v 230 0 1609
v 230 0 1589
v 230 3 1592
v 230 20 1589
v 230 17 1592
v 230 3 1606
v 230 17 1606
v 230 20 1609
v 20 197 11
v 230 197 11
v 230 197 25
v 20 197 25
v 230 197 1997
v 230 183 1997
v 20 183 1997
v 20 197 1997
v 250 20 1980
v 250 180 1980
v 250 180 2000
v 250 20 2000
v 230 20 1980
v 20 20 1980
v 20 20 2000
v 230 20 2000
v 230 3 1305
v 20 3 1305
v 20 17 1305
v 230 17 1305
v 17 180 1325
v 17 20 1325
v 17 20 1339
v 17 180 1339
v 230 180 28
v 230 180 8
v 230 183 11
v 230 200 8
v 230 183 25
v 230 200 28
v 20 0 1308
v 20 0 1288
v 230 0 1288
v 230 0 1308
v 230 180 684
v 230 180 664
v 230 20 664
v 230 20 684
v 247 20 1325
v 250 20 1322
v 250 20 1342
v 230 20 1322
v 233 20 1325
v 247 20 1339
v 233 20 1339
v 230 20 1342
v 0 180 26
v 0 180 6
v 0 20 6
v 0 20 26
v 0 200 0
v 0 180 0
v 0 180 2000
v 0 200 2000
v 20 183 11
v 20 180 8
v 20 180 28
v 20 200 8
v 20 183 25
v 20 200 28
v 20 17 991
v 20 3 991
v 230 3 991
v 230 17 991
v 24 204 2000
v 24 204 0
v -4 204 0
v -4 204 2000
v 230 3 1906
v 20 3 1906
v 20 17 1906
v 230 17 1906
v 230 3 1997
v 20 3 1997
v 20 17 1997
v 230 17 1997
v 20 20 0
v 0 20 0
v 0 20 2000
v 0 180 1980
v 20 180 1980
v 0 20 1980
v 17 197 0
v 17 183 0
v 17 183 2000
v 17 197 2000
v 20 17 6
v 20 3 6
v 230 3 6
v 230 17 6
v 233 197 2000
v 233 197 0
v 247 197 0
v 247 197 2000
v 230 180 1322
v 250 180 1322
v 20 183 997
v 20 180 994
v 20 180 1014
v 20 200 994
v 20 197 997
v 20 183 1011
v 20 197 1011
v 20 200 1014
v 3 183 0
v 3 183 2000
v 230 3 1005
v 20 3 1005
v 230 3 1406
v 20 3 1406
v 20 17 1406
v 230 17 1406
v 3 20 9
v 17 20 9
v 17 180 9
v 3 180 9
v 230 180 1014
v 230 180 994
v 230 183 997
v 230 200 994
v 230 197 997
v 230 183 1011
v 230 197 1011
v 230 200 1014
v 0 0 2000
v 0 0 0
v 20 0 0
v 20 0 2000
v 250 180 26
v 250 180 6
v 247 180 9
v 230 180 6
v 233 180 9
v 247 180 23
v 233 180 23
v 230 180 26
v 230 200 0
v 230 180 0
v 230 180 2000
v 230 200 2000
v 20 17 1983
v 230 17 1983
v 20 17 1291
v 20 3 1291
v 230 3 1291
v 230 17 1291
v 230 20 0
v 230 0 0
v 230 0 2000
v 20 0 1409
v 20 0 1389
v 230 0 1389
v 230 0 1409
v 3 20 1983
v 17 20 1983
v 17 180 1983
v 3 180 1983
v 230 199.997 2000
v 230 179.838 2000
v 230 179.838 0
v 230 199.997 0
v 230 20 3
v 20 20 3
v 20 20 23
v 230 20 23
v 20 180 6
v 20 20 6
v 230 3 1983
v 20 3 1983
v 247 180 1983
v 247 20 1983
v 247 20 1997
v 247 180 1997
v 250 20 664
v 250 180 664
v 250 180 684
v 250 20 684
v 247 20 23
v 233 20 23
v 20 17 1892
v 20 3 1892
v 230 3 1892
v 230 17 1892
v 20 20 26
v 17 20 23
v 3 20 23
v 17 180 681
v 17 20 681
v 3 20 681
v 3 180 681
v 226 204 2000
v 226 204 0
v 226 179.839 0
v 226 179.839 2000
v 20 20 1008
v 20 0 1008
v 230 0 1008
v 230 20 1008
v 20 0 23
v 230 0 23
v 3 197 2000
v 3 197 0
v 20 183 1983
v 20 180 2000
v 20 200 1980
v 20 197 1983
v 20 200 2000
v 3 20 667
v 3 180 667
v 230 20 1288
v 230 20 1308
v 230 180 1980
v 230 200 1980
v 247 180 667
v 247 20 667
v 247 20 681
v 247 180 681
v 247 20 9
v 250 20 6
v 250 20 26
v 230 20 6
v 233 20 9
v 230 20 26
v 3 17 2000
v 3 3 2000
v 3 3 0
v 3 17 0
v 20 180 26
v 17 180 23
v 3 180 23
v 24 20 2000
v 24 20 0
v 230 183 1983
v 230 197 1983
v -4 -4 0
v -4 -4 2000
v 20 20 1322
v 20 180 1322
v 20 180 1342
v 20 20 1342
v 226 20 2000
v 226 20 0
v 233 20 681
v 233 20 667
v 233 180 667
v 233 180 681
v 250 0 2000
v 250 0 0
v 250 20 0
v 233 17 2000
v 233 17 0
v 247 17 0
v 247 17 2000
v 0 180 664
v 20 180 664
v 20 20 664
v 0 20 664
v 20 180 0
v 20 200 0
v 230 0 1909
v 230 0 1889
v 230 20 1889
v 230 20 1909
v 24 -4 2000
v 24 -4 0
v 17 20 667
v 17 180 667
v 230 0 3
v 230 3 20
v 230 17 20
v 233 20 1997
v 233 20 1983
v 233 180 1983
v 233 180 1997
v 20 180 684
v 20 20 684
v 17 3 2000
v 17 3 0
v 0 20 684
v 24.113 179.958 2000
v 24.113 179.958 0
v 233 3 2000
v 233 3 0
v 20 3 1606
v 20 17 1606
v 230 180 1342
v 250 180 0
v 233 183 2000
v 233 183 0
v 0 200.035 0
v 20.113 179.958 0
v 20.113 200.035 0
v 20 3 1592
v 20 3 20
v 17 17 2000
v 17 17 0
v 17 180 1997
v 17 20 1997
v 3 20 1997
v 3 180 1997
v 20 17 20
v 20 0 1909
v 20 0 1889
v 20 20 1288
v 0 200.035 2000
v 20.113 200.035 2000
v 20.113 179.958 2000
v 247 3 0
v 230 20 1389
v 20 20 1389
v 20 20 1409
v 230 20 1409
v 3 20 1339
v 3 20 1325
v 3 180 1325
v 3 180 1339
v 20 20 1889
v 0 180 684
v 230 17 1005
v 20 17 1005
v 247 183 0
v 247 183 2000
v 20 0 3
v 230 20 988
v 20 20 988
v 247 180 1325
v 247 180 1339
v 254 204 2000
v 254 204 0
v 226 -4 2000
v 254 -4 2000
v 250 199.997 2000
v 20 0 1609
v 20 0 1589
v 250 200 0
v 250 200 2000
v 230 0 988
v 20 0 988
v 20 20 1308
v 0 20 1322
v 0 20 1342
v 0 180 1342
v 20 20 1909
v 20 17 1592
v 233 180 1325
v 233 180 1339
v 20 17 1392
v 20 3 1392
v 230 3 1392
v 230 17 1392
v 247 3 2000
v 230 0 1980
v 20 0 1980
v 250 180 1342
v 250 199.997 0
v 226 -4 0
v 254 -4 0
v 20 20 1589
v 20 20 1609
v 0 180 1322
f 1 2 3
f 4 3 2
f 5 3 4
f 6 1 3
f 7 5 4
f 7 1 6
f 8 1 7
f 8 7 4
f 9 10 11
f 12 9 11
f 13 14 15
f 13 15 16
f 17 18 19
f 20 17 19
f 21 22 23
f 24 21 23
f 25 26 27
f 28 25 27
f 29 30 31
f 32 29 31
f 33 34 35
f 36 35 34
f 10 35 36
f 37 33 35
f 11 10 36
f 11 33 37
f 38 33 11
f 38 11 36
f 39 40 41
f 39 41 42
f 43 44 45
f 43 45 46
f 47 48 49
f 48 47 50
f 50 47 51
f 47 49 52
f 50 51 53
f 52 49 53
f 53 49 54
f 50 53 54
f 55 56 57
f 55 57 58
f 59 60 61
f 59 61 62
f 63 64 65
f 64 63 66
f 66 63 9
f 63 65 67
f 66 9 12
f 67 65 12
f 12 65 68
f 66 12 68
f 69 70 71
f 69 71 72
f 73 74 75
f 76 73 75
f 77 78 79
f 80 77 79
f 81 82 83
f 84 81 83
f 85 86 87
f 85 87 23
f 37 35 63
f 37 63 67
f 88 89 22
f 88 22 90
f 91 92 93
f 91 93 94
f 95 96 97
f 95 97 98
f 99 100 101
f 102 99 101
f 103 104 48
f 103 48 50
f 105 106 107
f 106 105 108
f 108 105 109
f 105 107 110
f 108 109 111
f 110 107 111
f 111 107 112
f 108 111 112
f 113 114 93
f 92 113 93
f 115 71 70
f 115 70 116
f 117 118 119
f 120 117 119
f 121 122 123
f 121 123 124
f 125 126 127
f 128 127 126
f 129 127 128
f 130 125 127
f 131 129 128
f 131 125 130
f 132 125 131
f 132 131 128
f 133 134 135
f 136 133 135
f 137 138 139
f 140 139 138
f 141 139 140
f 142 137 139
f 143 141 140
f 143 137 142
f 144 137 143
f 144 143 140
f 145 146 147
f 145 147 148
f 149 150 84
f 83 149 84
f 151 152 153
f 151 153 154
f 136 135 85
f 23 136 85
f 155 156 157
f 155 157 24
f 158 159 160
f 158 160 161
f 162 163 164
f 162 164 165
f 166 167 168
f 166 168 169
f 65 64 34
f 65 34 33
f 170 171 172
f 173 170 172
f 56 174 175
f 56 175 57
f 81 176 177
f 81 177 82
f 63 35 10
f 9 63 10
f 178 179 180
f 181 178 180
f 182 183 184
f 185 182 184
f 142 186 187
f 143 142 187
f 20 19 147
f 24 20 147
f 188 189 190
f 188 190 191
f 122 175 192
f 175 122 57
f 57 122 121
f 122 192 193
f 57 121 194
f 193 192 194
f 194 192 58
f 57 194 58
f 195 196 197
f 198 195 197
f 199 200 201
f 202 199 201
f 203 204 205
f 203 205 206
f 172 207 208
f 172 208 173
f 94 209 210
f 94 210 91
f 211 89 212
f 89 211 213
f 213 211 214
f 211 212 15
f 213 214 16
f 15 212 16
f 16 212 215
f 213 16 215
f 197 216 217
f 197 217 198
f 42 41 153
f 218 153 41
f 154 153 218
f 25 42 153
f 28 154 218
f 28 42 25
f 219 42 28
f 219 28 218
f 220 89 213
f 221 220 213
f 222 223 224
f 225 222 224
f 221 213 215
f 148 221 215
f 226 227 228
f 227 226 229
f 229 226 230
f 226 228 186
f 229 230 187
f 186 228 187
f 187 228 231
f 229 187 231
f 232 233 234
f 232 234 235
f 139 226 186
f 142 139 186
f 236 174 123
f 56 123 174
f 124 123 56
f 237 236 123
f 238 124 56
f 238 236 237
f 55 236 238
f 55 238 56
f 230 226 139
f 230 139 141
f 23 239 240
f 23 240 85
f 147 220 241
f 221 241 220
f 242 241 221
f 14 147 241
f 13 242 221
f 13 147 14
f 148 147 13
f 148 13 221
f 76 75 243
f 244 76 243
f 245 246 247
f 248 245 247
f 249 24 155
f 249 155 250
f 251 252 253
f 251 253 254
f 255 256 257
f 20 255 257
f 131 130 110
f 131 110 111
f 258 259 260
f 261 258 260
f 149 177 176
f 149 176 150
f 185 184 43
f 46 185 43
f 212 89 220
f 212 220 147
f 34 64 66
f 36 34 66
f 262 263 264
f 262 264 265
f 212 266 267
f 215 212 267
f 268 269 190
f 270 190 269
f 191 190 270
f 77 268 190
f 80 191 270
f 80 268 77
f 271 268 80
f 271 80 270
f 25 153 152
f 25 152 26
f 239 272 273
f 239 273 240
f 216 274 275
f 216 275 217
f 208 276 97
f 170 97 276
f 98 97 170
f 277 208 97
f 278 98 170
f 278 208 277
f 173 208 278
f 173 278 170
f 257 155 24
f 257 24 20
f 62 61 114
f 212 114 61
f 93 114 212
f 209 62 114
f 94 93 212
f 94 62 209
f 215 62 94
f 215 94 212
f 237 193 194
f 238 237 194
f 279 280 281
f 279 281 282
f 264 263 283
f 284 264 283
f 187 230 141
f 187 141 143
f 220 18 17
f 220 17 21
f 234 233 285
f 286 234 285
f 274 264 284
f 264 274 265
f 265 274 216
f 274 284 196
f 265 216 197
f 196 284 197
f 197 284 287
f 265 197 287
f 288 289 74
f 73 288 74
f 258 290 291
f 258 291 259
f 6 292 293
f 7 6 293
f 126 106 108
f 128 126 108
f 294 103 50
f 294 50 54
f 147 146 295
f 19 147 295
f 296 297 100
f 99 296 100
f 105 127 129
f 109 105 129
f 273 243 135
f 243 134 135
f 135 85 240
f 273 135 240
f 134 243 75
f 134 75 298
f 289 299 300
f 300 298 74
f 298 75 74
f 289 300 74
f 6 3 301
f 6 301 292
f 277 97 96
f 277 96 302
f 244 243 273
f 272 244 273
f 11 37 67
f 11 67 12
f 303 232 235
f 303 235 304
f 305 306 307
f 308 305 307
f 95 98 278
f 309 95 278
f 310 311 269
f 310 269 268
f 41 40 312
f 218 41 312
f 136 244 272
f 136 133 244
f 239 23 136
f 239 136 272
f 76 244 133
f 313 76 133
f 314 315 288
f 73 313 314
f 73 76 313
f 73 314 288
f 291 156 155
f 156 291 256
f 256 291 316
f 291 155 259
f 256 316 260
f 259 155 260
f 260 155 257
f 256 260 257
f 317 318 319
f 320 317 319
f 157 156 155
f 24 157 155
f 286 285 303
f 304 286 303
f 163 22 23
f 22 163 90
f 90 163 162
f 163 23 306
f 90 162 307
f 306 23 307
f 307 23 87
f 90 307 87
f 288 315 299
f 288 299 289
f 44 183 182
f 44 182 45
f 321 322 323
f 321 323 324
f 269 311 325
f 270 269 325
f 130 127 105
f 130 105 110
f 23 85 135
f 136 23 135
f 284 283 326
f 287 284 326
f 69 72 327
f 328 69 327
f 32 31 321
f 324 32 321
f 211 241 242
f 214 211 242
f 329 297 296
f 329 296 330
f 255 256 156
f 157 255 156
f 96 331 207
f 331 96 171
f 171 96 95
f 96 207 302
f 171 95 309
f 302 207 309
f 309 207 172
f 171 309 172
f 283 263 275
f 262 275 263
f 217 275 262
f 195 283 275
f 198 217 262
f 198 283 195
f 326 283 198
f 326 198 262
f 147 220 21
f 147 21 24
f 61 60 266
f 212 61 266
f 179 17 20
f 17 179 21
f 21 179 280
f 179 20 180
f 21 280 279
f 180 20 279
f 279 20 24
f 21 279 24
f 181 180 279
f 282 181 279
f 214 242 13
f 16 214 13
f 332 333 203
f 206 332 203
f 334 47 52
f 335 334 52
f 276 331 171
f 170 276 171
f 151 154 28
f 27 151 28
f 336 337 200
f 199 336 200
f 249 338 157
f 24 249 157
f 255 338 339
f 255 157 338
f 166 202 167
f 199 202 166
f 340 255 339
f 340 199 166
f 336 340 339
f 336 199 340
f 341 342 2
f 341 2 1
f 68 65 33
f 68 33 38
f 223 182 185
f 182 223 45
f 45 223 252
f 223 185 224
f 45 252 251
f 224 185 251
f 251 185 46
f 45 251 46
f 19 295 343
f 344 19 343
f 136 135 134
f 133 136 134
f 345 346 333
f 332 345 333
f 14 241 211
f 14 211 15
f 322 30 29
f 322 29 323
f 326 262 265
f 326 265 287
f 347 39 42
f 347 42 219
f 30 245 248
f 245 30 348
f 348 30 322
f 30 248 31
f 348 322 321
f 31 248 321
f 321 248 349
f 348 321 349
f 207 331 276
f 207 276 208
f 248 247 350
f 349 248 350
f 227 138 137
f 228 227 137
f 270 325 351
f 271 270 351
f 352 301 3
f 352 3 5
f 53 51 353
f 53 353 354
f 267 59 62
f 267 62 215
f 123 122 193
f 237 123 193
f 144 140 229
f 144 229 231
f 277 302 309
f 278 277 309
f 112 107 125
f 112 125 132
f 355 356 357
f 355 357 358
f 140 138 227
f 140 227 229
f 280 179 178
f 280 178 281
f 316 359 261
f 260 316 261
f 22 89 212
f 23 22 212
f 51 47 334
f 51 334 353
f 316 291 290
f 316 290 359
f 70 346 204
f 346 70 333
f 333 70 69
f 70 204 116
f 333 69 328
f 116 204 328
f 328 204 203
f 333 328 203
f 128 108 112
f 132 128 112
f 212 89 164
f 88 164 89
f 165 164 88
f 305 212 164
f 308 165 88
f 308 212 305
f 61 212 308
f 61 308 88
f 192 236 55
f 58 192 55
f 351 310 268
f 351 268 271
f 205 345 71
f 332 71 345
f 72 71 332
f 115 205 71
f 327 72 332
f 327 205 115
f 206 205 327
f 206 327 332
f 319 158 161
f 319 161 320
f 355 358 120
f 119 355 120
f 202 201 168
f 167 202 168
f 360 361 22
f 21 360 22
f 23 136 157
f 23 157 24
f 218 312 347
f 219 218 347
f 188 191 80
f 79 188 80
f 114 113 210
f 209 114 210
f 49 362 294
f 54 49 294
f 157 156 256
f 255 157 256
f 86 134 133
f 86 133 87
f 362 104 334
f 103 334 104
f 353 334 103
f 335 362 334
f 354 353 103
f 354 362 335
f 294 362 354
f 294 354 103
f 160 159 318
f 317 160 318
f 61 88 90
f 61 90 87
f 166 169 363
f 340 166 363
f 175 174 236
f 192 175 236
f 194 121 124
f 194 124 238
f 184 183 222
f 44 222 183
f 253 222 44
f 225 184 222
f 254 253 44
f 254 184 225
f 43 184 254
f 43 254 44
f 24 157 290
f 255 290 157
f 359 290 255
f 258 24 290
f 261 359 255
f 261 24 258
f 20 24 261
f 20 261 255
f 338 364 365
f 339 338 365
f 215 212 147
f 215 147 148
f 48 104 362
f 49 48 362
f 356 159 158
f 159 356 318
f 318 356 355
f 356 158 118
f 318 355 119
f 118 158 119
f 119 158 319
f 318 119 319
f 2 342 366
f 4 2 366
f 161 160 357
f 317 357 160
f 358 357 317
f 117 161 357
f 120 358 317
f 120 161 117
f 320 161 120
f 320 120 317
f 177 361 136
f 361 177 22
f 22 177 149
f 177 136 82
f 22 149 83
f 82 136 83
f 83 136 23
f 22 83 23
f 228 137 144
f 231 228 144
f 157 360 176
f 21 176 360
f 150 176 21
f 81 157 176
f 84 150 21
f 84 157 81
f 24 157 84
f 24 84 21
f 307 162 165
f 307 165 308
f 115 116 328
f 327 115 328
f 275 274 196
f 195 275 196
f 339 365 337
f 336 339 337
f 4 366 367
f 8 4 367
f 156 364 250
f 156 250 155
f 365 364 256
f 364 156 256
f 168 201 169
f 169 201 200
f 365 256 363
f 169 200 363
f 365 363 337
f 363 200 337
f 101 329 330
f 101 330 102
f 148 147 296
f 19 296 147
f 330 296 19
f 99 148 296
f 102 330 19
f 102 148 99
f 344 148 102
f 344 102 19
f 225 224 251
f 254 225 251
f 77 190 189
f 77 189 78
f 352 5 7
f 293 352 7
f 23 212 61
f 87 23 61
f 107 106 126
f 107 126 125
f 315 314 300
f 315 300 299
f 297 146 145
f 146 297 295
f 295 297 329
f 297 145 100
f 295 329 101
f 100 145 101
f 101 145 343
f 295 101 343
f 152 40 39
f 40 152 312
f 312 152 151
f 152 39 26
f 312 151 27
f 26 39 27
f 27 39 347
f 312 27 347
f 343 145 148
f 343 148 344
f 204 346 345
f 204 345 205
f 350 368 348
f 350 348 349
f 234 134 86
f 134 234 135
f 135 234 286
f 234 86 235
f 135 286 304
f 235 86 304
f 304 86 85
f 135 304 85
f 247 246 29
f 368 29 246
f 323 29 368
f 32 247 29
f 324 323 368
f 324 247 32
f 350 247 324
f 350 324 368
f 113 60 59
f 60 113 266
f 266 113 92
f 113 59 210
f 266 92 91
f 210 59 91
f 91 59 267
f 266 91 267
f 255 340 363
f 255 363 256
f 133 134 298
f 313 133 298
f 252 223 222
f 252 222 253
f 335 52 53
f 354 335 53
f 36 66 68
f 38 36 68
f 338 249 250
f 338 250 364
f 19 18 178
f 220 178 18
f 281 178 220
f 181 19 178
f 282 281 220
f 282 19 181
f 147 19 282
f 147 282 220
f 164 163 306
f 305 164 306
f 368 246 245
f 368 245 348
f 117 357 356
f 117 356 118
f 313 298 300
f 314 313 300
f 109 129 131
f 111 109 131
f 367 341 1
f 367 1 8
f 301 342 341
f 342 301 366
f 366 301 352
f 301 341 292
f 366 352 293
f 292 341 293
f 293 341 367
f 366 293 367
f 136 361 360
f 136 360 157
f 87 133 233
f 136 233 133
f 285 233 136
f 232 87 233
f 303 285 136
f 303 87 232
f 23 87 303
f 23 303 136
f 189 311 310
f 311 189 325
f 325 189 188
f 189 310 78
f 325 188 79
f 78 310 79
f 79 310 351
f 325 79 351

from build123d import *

# Parameters (mm, degrees)
F0_W     = 20
F0_H     = 20
F0_W_2   = 14
F0_H_2   = 14
F1_DEPTH = 2000
F3_DEPTH = 2000
F4_W     = 20
F4_H     = 20
F4_W_2   = 14
F4_H_2   = 14
F5_DEPTH = 210
F6_W     = 20
F6_H     = 20
F6_W_2   = 14
F6_H_2   = 14
F7_DEPTH = 160
F8_W     = 20
F8_H     = 20
F8_W_2   = 14
F8_H_2   = 14
F9_DEPTH = 210


# Not quite as in the source:
# - a feature names something its author has since deleted; it is built from what else it names


with BuildPart() as f1:
    # F0 (on Top) → F1 (new body)
    with BuildSketch(Plane.XY):
        with Locations((10, 190)):
            Rectangle(F0_W, F0_H)
        with Locations((10, 190)):
            Rectangle(F0_W_2, F0_H_2, mode=Mode.SUBTRACT)
    extrude(amount=F1_DEPTH)


with BuildPart() as f1b:
    # F0 (on Top) → F1, piece 2 (new body)
    with BuildSketch(Plane.XY):
        with Locations((240, 190)):
            Rectangle(F0_W, F0_H)
        with Locations((240, 190)):
            Rectangle(F0_W_2, F0_H_2, mode=Mode.SUBTRACT)
    extrude(amount=F1_DEPTH)


with BuildPart() as f1c:
    # F0 (on Top) → F1, piece 3 (new body)
    with BuildSketch(Plane.XY):
        with Locations((240, 10)):
            Rectangle(F0_W, F0_H)
        with Locations((240, 10)):
            Rectangle(F0_W_2, F0_H_2, mode=Mode.SUBTRACT)
    extrude(amount=F1_DEPTH)


with BuildPart() as f1d:
    # F0 (on Top) → F1, piece 4 (new body)
    with BuildSketch(Plane.XY):
        with Locations((10, 10)):
            Rectangle(F0_W, F0_H)
        with Locations((10, 10)):
            Rectangle(F0_W_2, F0_H_2, mode=Mode.SUBTRACT)
    extrude(amount=F1_DEPTH)


with BuildPart() as f3:
    # F2 (on Top) → F3 (new body)
    with BuildSketch(Plane.XY):
        Polygon((20.0002528727, 0), (0, 0), (0, 200.0347077847), (20.113453269, 200.0347077847), (20.113453269, 179.9583435059), (24.113453269, 179.9583435059), (24, 204), (-4, 204), (-4, -4), (24.0002528727, -4), (24.0002528727, 20), (20.0002528727, 20), align=None)
    extrude(amount=F3_DEPTH)


with BuildPart() as f3b:
    # F2 (on Top) → F3, piece 2 (new body)
    with BuildSketch(Plane.XY):
        Polygon((229.9997471273, 20), (225.9997471273, 20), (225.9997471273, -4), (254, -4), (254, 204), (226, 204), (226.0000001659, 179.8393327155), (230, 179.838180542), (230, 199.9974697828), (250, 199.9974697828), (250, 0), (229.9997471273, 0), align=None)
    extrude(amount=F3_DEPTH)


with BuildPart() as f5:
    # F4 (on face) → F5 (new body)
    with BuildSketch(Plane.YZ.offset(20)):
        with Locations((10, 1990)):
            Rectangle(F4_W, F4_H)
        with Locations((10, 1990)):
            Rectangle(F4_W_2, F4_H_2, mode=Mode.SUBTRACT)
    extrude(amount=F5_DEPTH)


with BuildPart() as f5b:
    # F4 (on face) → F5, piece 2 (new body)
    with BuildSketch(Plane.YZ.offset(20)):
        with Locations((10, 1899)):
            Rectangle(F4_W, F4_H)
        with Locations((10, 1899)):
            Rectangle(F4_W_2, F4_H_2, mode=Mode.SUBTRACT)
    extrude(amount=F5_DEPTH)


with BuildPart() as f5c:
    # F4 (on face) → F5, piece 3 (new body)
    with BuildSketch(Plane.YZ.offset(20)):
        with Locations((10, 1599)):
            Rectangle(F4_W, F4_H)
        with Locations((10, 1599)):
            Rectangle(F4_W_2, F4_H_2, mode=Mode.SUBTRACT)
    extrude(amount=F5_DEPTH)


with BuildPart() as f5d:
    # F4 (on face) → F5, piece 4 (new body)
    with BuildSketch(Plane.YZ.offset(20)):
        with Locations((10, 1399)):
            Rectangle(F4_W, F4_H)
        with Locations((10, 1399)):
            Rectangle(F4_W_2, F4_H_2, mode=Mode.SUBTRACT)
    extrude(amount=F5_DEPTH)


with BuildPart() as f5e:
    # F4 (on face) → F5, piece 5 (new body)
    with BuildSketch(Plane.YZ.offset(20)):
        with Locations((10, 1298)):
            Rectangle(F4_W, F4_H)
        with Locations((10, 1298)):
            Rectangle(F4_W_2, F4_H_2, mode=Mode.SUBTRACT)
    extrude(amount=F5_DEPTH)


with BuildPart() as f5f:
    # F4 (on face) → F5, piece 6 (new body)
    with BuildSketch(Plane.YZ.offset(20)):
        with Locations((10, 998)):
            Rectangle(F4_W, F4_H)
        with Locations((10, 998)):
            Rectangle(F4_W_2, F4_H_2, mode=Mode.SUBTRACT)
    extrude(amount=F5_DEPTH)


with BuildPart() as f5g:
    # F4 (on face) → F5, piece 7 (new body)
    with BuildSketch(Plane.YZ.offset(20)):
        with Locations((10, 13)):
            Rectangle(F4_W, F4_H)
        with Locations((10, 13)):
            Rectangle(F4_W_2, F4_H_2, mode=Mode.SUBTRACT)
    extrude(amount=F5_DEPTH)


with BuildPart() as f7:
    # F6 (on face) → F7 (new body)
    with BuildSketch(Plane(origin=(0, 20, 0), x_dir=(-1, 0, 0), z_dir=(0, 1, 0))):
        with Locations((-10, 1990)):
            Rectangle(F6_W, F6_H)
        with Locations((-10, 1990)):
            Rectangle(F6_W_2, F6_H_2, mode=Mode.SUBTRACT)
    extrude(amount=F7_DEPTH)


with BuildPart() as f7b:
    # F6 (on face) → F7, piece 2 (new body)
    with BuildSketch(Plane(origin=(0, 20, 0), x_dir=(-1, 0, 0), z_dir=(0, 1, 0))):
        with Locations((-240, 1990)):
            Rectangle(F6_W, F6_H)
        with Locations((-240, 1990)):
            Rectangle(F6_W_2, F6_H_2, mode=Mode.SUBTRACT)
    extrude(amount=F7_DEPTH)


with BuildPart() as f7c:
    # F6 (on face) → F7, piece 3 (new body)
    with BuildSketch(Plane(origin=(0, 20, 0), x_dir=(-1, 0, 0), z_dir=(0, 1, 0))):
        with Locations((-10, 1332)):
            Rectangle(F6_W, F6_H)
        with Locations((-10, 1332)):
            Rectangle(F6_W_2, F6_H_2, mode=Mode.SUBTRACT)
    extrude(amount=F7_DEPTH)


with BuildPart() as f7d:
    # F6 (on face) → F7, piece 4 (new body)
    with BuildSketch(Plane(origin=(0, 20, 0), x_dir=(-1, 0, 0), z_dir=(0, 1, 0))):
        with Locations((-240, 1332)):
            Rectangle(F6_W, F6_H)
        with Locations((-240, 1332)):
            Rectangle(F6_W_2, F6_H_2, mode=Mode.SUBTRACT)
    extrude(amount=F7_DEPTH)


with BuildPart() as f7e:
    # F6 (on face) → F7, piece 5 (new body)
    with BuildSketch(Plane(origin=(0, 20, 0), x_dir=(-1, 0, 0), z_dir=(0, 1, 0))):
        with Locations((-10, 674)):
            Rectangle(F6_W, F6_H)
        with Locations((-10, 674)):
            Rectangle(F6_W_2, F6_H_2, mode=Mode.SUBTRACT)
    extrude(amount=F7_DEPTH)


with BuildPart() as f7f:
    # F6 (on face) → F7, piece 6 (new body)
    with BuildSketch(Plane(origin=(0, 20, 0), x_dir=(-1, 0, 0), z_dir=(0, 1, 0))):
        with Locations((-240, 674)):
            Rectangle(F6_W, F6_H)
        with Locations((-240, 674)):
            Rectangle(F6_W_2, F6_H_2, mode=Mode.SUBTRACT)
    extrude(amount=F7_DEPTH)


with BuildPart() as f7g:
    # F6 (on face) → F7, piece 7 (new body)
    with BuildSketch(Plane(origin=(0, 20, 0), x_dir=(-1, 0, 0), z_dir=(0, 1, 0))):
        with Locations((-10, 16)):
            Rectangle(F6_W, F6_H)
        with Locations((-10, 16)):
            Rectangle(F6_W_2, F6_H_2, mode=Mode.SUBTRACT)
    extrude(amount=F7_DEPTH)


with BuildPart() as f7h:
    # F6 (on face) → F7, piece 8 (new body)
    with BuildSketch(Plane(origin=(0, 20, 0), x_dir=(-1, 0, 0), z_dir=(0, 1, 0))):
        with Locations((-240, 16)):
            Rectangle(F6_W, F6_H)
        with Locations((-240, 16)):
            Rectangle(F6_W_2, F6_H_2, mode=Mode.SUBTRACT)
    extrude(amount=F7_DEPTH)


with BuildPart() as f9:
    # F8 (on face) → F9 (new body)
    with BuildSketch(Plane.YZ.offset(20)):
        with Locations((190, 1990)):
            Rectangle(F8_W, F8_H)
        with Locations((190, 1990)):
            Rectangle(F8_W_2, F8_H_2, mode=Mode.SUBTRACT)
    extrude(amount=F9_DEPTH)


with BuildPart() as f9b:
    # F8 (on face) → F9, piece 2 (new body)
    with BuildSketch(Plane.YZ.offset(20)):
        with Locations((190, 1004)):
            Rectangle(F8_W, F8_H)
        with Locations((190, 1004)):
            Rectangle(F8_W_2, F8_H_2, mode=Mode.SUBTRACT)
    extrude(amount=F9_DEPTH)


with BuildPart() as f9c:
    # F8 (on face) → F9, piece 3 (new body)
    with BuildSketch(Plane.YZ.offset(20)):
        with Locations((190, 18)):
            Rectangle(F8_W, F8_H)
        with Locations((190, 18)):
            Rectangle(F8_W_2, F8_H_2, mode=Mode.SUBTRACT)
    extrude(amount=F9_DEPTH)


solid = Compound([f1.part, f1b.part, f1c.part, f1d.part, f3.part, f3b.part, f5.part, f5b.part, f5c.part, f5d.part, f5e.part, f5f.part, f5g.part, f7.part, f7b.part, f7c.part, f7d.part, f7e.part, f7f.part, f7g.part, f7h.part, f9.part, f9b.part, f9c.part])
